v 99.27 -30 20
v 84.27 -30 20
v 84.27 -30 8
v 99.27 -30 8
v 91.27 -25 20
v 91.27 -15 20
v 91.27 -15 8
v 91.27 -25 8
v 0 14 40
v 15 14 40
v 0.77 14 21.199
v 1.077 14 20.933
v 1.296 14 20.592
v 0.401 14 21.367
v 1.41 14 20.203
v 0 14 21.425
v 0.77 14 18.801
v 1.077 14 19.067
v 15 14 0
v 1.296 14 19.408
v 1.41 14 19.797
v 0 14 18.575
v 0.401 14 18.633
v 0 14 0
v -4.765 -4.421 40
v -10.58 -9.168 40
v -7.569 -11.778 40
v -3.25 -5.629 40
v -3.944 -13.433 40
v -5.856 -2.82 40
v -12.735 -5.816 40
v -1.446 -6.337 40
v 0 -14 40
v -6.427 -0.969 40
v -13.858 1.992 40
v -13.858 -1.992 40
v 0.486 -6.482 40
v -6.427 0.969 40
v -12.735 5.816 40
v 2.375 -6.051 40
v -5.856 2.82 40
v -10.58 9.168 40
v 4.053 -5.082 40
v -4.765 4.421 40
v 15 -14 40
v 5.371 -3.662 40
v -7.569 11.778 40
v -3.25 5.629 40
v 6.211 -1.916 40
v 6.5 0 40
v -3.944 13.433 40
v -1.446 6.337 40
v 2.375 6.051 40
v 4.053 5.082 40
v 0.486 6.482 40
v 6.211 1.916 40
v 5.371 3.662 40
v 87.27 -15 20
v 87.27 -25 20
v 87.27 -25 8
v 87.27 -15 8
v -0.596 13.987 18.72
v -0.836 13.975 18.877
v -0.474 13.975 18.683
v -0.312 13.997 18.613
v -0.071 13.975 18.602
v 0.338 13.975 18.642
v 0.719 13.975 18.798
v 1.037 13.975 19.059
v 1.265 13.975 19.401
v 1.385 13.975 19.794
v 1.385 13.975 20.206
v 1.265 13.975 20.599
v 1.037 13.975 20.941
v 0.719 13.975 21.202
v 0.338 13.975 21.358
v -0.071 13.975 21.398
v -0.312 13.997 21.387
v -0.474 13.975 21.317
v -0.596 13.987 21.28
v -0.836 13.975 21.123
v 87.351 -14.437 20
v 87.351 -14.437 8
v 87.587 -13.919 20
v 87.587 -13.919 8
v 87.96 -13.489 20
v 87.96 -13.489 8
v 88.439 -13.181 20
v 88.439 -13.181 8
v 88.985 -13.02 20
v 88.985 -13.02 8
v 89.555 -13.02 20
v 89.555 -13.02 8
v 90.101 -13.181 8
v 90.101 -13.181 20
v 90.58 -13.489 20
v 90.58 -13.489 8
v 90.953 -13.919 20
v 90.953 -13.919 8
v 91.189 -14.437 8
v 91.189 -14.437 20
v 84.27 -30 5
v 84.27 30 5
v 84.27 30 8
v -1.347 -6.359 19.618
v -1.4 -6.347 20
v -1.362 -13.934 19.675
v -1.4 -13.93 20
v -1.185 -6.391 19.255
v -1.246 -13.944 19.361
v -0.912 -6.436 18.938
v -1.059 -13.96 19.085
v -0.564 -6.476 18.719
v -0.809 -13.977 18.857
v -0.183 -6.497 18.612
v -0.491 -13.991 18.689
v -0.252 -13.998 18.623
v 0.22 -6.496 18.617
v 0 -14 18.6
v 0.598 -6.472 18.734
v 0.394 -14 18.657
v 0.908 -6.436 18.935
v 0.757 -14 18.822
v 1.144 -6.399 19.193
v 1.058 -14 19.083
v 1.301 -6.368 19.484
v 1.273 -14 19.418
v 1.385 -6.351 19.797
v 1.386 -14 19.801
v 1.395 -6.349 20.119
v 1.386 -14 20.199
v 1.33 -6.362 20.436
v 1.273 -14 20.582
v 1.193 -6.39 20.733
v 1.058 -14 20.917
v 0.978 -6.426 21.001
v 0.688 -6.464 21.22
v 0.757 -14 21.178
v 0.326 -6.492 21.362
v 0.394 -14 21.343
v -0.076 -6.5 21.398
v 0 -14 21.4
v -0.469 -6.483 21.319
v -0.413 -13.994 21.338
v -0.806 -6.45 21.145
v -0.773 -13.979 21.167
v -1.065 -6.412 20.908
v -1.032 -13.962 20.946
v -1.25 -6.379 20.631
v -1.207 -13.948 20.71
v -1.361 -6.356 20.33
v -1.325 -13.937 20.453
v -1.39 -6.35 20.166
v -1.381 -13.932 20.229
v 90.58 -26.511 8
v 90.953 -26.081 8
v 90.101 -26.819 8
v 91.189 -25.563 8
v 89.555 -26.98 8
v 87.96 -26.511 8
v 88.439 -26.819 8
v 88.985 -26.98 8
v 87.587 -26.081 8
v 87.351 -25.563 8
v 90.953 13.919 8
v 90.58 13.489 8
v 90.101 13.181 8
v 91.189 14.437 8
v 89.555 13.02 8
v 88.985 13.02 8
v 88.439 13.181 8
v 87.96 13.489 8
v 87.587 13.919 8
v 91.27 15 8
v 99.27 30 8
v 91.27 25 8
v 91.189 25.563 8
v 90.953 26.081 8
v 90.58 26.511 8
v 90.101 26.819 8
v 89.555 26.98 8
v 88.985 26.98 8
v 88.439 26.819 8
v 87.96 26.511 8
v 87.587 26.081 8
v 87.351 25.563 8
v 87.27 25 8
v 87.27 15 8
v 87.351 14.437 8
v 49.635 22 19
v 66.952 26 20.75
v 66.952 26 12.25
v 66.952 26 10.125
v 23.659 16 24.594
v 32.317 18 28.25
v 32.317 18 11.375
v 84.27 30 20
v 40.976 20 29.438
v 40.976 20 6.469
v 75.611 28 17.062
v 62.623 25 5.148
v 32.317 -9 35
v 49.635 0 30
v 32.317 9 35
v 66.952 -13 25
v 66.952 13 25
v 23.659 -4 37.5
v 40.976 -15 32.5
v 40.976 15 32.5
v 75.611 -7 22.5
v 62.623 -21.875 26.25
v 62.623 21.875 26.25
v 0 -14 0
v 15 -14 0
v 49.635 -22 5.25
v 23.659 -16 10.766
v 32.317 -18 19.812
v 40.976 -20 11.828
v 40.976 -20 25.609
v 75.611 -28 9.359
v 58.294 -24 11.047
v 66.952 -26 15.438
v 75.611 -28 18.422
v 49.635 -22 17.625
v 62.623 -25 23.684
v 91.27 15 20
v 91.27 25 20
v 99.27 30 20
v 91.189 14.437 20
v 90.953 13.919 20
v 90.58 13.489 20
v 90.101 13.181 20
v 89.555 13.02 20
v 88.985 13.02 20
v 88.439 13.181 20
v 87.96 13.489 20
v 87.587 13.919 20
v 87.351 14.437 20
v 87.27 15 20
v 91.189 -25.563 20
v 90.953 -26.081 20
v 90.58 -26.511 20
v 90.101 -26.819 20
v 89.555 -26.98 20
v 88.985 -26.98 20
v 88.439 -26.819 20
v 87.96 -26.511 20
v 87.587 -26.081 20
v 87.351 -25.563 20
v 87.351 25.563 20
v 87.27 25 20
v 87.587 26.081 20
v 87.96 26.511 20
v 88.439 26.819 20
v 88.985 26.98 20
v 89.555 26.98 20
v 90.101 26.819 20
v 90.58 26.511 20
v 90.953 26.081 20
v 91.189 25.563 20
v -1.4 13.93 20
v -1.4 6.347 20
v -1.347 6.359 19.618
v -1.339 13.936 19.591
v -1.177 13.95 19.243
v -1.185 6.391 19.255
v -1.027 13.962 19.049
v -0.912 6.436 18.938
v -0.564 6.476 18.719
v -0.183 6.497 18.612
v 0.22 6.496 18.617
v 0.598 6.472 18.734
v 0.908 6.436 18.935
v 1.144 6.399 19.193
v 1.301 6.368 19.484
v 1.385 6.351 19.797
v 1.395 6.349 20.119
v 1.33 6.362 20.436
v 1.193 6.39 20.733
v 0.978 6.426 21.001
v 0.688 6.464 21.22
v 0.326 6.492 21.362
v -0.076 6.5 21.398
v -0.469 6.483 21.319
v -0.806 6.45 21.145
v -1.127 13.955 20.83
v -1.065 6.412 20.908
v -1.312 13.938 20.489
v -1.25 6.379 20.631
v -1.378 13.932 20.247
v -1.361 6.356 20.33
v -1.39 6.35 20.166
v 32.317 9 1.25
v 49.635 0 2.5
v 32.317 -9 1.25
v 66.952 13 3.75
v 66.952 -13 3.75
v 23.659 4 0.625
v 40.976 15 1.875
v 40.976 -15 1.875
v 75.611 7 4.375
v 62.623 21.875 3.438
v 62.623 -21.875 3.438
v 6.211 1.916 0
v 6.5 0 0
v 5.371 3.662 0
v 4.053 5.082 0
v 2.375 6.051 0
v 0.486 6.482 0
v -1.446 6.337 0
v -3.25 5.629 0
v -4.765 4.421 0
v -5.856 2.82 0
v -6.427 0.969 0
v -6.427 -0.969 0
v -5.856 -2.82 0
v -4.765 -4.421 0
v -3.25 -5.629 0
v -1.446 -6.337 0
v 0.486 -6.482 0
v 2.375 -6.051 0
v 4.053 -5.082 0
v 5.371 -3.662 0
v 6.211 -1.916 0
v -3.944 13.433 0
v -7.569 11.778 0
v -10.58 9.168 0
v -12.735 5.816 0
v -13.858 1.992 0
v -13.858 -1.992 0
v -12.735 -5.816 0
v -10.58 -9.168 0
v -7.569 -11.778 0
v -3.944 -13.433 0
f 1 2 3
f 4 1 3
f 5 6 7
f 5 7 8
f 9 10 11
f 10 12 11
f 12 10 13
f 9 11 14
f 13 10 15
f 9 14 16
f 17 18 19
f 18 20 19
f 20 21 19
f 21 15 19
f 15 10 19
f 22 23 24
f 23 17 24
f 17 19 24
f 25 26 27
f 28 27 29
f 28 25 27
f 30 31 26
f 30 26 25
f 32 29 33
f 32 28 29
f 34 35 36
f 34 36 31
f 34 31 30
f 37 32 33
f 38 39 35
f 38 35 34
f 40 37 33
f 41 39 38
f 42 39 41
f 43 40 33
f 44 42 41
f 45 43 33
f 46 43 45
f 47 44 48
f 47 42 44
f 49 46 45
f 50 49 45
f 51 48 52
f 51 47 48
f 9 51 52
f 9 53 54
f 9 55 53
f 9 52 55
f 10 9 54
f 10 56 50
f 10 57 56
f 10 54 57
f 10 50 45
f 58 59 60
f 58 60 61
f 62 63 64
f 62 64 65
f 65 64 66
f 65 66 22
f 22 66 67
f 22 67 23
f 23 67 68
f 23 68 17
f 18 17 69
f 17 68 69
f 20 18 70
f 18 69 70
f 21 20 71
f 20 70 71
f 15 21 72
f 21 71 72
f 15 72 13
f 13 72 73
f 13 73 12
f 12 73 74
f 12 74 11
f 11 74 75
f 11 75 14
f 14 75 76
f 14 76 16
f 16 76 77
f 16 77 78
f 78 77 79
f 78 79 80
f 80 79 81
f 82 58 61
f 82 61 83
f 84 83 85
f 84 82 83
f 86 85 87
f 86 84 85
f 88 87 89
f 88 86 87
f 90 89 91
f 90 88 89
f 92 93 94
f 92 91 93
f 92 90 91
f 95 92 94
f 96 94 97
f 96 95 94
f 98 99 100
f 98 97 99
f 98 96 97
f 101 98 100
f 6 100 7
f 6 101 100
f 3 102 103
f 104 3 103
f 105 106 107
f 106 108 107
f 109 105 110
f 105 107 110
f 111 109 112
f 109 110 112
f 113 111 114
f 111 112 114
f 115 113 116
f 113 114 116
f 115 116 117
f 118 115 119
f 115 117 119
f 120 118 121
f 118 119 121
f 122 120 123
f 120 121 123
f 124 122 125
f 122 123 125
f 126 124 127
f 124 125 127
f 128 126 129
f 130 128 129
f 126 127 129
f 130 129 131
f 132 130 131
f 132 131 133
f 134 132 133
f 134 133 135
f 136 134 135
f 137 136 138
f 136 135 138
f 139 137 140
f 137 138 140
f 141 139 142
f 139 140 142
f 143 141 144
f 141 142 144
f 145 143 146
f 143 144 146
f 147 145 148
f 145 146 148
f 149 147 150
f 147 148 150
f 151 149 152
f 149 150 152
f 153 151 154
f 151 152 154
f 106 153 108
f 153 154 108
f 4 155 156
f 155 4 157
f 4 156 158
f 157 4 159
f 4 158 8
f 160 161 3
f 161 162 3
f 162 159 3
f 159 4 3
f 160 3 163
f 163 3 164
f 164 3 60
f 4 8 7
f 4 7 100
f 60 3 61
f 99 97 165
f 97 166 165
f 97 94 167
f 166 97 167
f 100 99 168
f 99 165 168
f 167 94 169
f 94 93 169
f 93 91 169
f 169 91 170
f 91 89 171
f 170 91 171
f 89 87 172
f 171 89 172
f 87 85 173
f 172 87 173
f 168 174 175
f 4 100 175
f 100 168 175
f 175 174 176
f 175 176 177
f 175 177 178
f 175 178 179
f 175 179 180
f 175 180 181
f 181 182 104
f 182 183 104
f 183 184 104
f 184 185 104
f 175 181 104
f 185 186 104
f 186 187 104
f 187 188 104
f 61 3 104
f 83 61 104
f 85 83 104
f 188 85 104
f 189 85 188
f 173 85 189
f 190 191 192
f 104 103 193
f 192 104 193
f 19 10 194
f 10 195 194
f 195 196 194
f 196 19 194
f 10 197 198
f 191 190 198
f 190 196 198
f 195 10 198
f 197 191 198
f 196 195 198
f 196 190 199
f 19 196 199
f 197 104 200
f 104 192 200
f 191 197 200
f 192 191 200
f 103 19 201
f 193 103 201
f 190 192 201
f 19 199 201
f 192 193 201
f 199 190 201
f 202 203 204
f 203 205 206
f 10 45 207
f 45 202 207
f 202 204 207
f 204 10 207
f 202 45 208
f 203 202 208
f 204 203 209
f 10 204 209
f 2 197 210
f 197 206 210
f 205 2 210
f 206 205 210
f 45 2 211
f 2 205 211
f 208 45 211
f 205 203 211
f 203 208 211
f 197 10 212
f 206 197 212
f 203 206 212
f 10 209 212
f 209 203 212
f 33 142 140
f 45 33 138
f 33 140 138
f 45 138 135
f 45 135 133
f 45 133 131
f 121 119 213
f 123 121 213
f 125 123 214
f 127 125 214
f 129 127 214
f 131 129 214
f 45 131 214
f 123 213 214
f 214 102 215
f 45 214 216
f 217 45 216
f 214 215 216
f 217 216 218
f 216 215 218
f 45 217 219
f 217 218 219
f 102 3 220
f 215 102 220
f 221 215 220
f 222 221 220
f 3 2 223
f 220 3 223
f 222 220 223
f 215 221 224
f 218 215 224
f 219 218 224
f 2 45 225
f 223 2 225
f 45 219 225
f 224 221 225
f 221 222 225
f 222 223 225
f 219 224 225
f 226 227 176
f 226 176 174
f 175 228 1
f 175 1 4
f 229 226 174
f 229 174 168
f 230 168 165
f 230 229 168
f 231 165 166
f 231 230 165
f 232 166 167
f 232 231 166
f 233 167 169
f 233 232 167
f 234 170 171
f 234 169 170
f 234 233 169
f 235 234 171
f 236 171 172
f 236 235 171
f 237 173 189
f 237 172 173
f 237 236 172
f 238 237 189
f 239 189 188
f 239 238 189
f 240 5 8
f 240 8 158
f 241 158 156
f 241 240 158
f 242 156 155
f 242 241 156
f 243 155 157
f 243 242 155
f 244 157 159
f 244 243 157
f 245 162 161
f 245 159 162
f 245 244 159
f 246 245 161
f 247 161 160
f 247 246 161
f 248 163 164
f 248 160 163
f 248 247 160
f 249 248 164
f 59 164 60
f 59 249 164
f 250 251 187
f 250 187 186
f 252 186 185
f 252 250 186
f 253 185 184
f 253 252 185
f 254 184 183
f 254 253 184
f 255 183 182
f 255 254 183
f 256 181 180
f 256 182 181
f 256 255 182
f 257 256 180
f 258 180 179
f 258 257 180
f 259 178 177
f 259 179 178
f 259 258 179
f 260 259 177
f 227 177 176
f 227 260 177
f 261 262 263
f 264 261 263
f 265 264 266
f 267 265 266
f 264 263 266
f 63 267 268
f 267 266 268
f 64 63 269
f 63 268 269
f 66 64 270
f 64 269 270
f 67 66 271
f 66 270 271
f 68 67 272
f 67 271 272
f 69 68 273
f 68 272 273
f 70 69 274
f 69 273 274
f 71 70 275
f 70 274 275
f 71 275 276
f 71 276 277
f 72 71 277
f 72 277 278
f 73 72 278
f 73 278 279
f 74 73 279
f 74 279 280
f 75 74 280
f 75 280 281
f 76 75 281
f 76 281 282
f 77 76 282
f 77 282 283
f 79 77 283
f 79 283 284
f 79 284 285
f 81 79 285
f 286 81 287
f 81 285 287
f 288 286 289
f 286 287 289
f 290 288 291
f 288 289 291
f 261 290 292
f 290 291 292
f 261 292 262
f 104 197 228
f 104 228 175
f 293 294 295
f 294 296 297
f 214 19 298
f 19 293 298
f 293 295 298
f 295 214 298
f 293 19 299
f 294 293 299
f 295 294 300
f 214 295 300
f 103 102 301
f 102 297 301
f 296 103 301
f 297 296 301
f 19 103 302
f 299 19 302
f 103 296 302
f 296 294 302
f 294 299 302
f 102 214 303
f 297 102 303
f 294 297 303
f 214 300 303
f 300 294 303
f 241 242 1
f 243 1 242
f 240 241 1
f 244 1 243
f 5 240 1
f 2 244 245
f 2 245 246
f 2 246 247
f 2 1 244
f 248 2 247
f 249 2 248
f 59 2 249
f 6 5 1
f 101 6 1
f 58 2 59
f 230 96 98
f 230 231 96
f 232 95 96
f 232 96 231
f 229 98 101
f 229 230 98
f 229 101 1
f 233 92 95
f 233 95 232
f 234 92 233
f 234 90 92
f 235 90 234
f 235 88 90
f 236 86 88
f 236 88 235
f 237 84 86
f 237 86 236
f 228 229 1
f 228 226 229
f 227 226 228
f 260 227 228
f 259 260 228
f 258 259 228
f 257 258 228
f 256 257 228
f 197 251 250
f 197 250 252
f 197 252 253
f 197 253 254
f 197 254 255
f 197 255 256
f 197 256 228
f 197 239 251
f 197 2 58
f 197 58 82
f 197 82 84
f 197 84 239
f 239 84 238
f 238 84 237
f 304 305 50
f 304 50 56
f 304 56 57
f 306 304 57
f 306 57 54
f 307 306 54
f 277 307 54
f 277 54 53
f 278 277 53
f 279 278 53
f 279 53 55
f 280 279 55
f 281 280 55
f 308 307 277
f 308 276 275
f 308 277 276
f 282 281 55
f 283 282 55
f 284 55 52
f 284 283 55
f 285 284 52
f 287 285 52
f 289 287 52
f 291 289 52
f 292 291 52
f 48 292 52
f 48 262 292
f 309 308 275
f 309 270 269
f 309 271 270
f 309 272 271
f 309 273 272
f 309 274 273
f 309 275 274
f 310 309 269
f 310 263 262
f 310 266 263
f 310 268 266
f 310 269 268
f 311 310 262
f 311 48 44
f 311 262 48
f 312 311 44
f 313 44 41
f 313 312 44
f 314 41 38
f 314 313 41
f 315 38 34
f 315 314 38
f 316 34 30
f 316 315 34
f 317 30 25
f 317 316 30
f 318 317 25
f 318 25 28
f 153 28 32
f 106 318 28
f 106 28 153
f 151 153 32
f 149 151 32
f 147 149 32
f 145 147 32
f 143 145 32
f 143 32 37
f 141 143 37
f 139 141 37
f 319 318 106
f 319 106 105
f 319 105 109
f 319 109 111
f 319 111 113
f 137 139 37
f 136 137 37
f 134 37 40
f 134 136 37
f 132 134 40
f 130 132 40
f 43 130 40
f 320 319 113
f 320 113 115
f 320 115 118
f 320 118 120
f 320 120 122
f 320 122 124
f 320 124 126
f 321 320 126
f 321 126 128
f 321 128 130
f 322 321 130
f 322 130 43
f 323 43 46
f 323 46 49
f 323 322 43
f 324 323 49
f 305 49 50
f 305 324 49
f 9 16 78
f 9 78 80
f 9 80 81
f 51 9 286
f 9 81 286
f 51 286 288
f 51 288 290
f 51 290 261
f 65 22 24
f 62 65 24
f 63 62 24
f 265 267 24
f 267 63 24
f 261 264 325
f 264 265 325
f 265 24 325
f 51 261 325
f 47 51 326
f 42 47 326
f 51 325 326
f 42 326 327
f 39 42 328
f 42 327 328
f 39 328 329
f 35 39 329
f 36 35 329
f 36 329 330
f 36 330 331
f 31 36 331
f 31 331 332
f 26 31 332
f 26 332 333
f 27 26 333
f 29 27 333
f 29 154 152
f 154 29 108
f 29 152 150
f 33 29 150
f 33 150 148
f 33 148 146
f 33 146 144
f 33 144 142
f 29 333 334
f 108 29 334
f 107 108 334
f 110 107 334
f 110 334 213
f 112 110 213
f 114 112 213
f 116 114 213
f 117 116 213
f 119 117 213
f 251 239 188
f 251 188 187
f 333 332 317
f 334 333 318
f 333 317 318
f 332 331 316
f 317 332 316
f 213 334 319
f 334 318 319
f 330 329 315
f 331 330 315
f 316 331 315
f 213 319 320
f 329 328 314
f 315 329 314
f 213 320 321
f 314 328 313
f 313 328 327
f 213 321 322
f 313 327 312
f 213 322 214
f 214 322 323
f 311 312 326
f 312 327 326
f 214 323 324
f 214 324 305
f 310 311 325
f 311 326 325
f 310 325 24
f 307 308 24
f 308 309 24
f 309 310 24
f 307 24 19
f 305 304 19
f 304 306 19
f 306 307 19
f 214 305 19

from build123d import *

# Parameters (mm, degrees)
SKETCH_1_R                        = 6.5
EXTRUDE_1_DEPTH                   = 40
SKETCH_2_W                        = 15
SKETCH_2_H                        = 60
SKETCH_3_W                        = 12
SKETCH_3_H                        = 60
EXTRUDE_2_DEPTH                   = 15
CUT_EXTRUDE_1_DEPTH               = 21.0000001
HOLE_WIZARD_2_8_2_8_1_D           = 2.8
HOLE_WIZARD_2_8_2_8_1_CSINK_D     = 2.85
HOLE_WIZARD_2_8_2_8_1_CSINK_ANGLE = 90


with BuildPart() as part:
    # 草圖1 → 填料-伸長1 (new body)
    with BuildSketch(Plane.XY):
        with BuildLine():
            Line((15, 14), (0, 14))
            ThreePointArc((0, 14), (-14, 0), (0, -14))
            Line((0, -14), (15, -14))
            Line((15, -14), (15, 14))
        make_face()
        Circle(SKETCH_1_R, mode=Mode.SUBTRACT)
    extrude(amount=EXTRUDE_1_DEPTH)

    # 草圖2 → section 1 of loft_1
    with BuildSketch(Plane(origin=(84.27, 0, 0), x_dir=(0, 0, -1), z_dir=(1, 0, 0)), mode=Mode.PRIVATE) as loft_1_s1:
        with Locations((-12.5, 0)):
            Rectangle(SKETCH_2_W, SKETCH_2_H)
    # loft from a face of the part (loft_1)
    loft([part.faces().sort_by_distance((15, 0, 20))[0], loft_1_s1.sketch])

    # 草圖3 → 填料-伸長2 (add)
    with BuildSketch(Plane(origin=(84.27, 0, 0), x_dir=(0, 0, -1), z_dir=(1, 0, 0))):
        with Locations((-14, 0)):
            Rectangle(SKETCH_3_W, SKETCH_3_H)
    extrude(amount=EXTRUDE_2_DEPTH)

    # 草圖4 → 除料-伸長1 (cut, through all)
    with BuildSketch(Plane.XY.offset(20)):
        with BuildLine():
            Line((91.27, 25), (91.27, 15))
            ThreePointArc((91.27, 15), (89.27, 13), (87.27, 15))
            Line((87.27, 15), (87.27, 25))
            ThreePointArc((87.27, 25), (89.27, 27), (91.27, 25))
        make_face()
        with BuildLine():
            Line((91.27, -15), (91.27, -25))
            ThreePointArc((91.27, -25), (89.27, -27), (87.27, -25))
            Line((87.27, -25), (87.27, -15))
            ThreePointArc((87.27, -15), (89.27, -13), (91.27, -15))
        make_face()
    extrude(amount=-CUT_EXTRUDE_1_DEPTH, mode=Mode.SUBTRACT)

    # Ø2.8 (2.8) 直徑孔1 (through all)
    with Locations(Plane(origin=(0, 14, 0), x_dir=(1, 0, 0), z_dir=(0, 1, 0))):
        with Locations((0, -20)):
            CounterSinkHole(HOLE_WIZARD_2_8_2_8_1_D / 2, HOLE_WIZARD_2_8_2_8_1_CSINK_D / 2, counter_sink_angle=HOLE_WIZARD_2_8_2_8_1_CSINK_ANGLE)


solid = part.part
